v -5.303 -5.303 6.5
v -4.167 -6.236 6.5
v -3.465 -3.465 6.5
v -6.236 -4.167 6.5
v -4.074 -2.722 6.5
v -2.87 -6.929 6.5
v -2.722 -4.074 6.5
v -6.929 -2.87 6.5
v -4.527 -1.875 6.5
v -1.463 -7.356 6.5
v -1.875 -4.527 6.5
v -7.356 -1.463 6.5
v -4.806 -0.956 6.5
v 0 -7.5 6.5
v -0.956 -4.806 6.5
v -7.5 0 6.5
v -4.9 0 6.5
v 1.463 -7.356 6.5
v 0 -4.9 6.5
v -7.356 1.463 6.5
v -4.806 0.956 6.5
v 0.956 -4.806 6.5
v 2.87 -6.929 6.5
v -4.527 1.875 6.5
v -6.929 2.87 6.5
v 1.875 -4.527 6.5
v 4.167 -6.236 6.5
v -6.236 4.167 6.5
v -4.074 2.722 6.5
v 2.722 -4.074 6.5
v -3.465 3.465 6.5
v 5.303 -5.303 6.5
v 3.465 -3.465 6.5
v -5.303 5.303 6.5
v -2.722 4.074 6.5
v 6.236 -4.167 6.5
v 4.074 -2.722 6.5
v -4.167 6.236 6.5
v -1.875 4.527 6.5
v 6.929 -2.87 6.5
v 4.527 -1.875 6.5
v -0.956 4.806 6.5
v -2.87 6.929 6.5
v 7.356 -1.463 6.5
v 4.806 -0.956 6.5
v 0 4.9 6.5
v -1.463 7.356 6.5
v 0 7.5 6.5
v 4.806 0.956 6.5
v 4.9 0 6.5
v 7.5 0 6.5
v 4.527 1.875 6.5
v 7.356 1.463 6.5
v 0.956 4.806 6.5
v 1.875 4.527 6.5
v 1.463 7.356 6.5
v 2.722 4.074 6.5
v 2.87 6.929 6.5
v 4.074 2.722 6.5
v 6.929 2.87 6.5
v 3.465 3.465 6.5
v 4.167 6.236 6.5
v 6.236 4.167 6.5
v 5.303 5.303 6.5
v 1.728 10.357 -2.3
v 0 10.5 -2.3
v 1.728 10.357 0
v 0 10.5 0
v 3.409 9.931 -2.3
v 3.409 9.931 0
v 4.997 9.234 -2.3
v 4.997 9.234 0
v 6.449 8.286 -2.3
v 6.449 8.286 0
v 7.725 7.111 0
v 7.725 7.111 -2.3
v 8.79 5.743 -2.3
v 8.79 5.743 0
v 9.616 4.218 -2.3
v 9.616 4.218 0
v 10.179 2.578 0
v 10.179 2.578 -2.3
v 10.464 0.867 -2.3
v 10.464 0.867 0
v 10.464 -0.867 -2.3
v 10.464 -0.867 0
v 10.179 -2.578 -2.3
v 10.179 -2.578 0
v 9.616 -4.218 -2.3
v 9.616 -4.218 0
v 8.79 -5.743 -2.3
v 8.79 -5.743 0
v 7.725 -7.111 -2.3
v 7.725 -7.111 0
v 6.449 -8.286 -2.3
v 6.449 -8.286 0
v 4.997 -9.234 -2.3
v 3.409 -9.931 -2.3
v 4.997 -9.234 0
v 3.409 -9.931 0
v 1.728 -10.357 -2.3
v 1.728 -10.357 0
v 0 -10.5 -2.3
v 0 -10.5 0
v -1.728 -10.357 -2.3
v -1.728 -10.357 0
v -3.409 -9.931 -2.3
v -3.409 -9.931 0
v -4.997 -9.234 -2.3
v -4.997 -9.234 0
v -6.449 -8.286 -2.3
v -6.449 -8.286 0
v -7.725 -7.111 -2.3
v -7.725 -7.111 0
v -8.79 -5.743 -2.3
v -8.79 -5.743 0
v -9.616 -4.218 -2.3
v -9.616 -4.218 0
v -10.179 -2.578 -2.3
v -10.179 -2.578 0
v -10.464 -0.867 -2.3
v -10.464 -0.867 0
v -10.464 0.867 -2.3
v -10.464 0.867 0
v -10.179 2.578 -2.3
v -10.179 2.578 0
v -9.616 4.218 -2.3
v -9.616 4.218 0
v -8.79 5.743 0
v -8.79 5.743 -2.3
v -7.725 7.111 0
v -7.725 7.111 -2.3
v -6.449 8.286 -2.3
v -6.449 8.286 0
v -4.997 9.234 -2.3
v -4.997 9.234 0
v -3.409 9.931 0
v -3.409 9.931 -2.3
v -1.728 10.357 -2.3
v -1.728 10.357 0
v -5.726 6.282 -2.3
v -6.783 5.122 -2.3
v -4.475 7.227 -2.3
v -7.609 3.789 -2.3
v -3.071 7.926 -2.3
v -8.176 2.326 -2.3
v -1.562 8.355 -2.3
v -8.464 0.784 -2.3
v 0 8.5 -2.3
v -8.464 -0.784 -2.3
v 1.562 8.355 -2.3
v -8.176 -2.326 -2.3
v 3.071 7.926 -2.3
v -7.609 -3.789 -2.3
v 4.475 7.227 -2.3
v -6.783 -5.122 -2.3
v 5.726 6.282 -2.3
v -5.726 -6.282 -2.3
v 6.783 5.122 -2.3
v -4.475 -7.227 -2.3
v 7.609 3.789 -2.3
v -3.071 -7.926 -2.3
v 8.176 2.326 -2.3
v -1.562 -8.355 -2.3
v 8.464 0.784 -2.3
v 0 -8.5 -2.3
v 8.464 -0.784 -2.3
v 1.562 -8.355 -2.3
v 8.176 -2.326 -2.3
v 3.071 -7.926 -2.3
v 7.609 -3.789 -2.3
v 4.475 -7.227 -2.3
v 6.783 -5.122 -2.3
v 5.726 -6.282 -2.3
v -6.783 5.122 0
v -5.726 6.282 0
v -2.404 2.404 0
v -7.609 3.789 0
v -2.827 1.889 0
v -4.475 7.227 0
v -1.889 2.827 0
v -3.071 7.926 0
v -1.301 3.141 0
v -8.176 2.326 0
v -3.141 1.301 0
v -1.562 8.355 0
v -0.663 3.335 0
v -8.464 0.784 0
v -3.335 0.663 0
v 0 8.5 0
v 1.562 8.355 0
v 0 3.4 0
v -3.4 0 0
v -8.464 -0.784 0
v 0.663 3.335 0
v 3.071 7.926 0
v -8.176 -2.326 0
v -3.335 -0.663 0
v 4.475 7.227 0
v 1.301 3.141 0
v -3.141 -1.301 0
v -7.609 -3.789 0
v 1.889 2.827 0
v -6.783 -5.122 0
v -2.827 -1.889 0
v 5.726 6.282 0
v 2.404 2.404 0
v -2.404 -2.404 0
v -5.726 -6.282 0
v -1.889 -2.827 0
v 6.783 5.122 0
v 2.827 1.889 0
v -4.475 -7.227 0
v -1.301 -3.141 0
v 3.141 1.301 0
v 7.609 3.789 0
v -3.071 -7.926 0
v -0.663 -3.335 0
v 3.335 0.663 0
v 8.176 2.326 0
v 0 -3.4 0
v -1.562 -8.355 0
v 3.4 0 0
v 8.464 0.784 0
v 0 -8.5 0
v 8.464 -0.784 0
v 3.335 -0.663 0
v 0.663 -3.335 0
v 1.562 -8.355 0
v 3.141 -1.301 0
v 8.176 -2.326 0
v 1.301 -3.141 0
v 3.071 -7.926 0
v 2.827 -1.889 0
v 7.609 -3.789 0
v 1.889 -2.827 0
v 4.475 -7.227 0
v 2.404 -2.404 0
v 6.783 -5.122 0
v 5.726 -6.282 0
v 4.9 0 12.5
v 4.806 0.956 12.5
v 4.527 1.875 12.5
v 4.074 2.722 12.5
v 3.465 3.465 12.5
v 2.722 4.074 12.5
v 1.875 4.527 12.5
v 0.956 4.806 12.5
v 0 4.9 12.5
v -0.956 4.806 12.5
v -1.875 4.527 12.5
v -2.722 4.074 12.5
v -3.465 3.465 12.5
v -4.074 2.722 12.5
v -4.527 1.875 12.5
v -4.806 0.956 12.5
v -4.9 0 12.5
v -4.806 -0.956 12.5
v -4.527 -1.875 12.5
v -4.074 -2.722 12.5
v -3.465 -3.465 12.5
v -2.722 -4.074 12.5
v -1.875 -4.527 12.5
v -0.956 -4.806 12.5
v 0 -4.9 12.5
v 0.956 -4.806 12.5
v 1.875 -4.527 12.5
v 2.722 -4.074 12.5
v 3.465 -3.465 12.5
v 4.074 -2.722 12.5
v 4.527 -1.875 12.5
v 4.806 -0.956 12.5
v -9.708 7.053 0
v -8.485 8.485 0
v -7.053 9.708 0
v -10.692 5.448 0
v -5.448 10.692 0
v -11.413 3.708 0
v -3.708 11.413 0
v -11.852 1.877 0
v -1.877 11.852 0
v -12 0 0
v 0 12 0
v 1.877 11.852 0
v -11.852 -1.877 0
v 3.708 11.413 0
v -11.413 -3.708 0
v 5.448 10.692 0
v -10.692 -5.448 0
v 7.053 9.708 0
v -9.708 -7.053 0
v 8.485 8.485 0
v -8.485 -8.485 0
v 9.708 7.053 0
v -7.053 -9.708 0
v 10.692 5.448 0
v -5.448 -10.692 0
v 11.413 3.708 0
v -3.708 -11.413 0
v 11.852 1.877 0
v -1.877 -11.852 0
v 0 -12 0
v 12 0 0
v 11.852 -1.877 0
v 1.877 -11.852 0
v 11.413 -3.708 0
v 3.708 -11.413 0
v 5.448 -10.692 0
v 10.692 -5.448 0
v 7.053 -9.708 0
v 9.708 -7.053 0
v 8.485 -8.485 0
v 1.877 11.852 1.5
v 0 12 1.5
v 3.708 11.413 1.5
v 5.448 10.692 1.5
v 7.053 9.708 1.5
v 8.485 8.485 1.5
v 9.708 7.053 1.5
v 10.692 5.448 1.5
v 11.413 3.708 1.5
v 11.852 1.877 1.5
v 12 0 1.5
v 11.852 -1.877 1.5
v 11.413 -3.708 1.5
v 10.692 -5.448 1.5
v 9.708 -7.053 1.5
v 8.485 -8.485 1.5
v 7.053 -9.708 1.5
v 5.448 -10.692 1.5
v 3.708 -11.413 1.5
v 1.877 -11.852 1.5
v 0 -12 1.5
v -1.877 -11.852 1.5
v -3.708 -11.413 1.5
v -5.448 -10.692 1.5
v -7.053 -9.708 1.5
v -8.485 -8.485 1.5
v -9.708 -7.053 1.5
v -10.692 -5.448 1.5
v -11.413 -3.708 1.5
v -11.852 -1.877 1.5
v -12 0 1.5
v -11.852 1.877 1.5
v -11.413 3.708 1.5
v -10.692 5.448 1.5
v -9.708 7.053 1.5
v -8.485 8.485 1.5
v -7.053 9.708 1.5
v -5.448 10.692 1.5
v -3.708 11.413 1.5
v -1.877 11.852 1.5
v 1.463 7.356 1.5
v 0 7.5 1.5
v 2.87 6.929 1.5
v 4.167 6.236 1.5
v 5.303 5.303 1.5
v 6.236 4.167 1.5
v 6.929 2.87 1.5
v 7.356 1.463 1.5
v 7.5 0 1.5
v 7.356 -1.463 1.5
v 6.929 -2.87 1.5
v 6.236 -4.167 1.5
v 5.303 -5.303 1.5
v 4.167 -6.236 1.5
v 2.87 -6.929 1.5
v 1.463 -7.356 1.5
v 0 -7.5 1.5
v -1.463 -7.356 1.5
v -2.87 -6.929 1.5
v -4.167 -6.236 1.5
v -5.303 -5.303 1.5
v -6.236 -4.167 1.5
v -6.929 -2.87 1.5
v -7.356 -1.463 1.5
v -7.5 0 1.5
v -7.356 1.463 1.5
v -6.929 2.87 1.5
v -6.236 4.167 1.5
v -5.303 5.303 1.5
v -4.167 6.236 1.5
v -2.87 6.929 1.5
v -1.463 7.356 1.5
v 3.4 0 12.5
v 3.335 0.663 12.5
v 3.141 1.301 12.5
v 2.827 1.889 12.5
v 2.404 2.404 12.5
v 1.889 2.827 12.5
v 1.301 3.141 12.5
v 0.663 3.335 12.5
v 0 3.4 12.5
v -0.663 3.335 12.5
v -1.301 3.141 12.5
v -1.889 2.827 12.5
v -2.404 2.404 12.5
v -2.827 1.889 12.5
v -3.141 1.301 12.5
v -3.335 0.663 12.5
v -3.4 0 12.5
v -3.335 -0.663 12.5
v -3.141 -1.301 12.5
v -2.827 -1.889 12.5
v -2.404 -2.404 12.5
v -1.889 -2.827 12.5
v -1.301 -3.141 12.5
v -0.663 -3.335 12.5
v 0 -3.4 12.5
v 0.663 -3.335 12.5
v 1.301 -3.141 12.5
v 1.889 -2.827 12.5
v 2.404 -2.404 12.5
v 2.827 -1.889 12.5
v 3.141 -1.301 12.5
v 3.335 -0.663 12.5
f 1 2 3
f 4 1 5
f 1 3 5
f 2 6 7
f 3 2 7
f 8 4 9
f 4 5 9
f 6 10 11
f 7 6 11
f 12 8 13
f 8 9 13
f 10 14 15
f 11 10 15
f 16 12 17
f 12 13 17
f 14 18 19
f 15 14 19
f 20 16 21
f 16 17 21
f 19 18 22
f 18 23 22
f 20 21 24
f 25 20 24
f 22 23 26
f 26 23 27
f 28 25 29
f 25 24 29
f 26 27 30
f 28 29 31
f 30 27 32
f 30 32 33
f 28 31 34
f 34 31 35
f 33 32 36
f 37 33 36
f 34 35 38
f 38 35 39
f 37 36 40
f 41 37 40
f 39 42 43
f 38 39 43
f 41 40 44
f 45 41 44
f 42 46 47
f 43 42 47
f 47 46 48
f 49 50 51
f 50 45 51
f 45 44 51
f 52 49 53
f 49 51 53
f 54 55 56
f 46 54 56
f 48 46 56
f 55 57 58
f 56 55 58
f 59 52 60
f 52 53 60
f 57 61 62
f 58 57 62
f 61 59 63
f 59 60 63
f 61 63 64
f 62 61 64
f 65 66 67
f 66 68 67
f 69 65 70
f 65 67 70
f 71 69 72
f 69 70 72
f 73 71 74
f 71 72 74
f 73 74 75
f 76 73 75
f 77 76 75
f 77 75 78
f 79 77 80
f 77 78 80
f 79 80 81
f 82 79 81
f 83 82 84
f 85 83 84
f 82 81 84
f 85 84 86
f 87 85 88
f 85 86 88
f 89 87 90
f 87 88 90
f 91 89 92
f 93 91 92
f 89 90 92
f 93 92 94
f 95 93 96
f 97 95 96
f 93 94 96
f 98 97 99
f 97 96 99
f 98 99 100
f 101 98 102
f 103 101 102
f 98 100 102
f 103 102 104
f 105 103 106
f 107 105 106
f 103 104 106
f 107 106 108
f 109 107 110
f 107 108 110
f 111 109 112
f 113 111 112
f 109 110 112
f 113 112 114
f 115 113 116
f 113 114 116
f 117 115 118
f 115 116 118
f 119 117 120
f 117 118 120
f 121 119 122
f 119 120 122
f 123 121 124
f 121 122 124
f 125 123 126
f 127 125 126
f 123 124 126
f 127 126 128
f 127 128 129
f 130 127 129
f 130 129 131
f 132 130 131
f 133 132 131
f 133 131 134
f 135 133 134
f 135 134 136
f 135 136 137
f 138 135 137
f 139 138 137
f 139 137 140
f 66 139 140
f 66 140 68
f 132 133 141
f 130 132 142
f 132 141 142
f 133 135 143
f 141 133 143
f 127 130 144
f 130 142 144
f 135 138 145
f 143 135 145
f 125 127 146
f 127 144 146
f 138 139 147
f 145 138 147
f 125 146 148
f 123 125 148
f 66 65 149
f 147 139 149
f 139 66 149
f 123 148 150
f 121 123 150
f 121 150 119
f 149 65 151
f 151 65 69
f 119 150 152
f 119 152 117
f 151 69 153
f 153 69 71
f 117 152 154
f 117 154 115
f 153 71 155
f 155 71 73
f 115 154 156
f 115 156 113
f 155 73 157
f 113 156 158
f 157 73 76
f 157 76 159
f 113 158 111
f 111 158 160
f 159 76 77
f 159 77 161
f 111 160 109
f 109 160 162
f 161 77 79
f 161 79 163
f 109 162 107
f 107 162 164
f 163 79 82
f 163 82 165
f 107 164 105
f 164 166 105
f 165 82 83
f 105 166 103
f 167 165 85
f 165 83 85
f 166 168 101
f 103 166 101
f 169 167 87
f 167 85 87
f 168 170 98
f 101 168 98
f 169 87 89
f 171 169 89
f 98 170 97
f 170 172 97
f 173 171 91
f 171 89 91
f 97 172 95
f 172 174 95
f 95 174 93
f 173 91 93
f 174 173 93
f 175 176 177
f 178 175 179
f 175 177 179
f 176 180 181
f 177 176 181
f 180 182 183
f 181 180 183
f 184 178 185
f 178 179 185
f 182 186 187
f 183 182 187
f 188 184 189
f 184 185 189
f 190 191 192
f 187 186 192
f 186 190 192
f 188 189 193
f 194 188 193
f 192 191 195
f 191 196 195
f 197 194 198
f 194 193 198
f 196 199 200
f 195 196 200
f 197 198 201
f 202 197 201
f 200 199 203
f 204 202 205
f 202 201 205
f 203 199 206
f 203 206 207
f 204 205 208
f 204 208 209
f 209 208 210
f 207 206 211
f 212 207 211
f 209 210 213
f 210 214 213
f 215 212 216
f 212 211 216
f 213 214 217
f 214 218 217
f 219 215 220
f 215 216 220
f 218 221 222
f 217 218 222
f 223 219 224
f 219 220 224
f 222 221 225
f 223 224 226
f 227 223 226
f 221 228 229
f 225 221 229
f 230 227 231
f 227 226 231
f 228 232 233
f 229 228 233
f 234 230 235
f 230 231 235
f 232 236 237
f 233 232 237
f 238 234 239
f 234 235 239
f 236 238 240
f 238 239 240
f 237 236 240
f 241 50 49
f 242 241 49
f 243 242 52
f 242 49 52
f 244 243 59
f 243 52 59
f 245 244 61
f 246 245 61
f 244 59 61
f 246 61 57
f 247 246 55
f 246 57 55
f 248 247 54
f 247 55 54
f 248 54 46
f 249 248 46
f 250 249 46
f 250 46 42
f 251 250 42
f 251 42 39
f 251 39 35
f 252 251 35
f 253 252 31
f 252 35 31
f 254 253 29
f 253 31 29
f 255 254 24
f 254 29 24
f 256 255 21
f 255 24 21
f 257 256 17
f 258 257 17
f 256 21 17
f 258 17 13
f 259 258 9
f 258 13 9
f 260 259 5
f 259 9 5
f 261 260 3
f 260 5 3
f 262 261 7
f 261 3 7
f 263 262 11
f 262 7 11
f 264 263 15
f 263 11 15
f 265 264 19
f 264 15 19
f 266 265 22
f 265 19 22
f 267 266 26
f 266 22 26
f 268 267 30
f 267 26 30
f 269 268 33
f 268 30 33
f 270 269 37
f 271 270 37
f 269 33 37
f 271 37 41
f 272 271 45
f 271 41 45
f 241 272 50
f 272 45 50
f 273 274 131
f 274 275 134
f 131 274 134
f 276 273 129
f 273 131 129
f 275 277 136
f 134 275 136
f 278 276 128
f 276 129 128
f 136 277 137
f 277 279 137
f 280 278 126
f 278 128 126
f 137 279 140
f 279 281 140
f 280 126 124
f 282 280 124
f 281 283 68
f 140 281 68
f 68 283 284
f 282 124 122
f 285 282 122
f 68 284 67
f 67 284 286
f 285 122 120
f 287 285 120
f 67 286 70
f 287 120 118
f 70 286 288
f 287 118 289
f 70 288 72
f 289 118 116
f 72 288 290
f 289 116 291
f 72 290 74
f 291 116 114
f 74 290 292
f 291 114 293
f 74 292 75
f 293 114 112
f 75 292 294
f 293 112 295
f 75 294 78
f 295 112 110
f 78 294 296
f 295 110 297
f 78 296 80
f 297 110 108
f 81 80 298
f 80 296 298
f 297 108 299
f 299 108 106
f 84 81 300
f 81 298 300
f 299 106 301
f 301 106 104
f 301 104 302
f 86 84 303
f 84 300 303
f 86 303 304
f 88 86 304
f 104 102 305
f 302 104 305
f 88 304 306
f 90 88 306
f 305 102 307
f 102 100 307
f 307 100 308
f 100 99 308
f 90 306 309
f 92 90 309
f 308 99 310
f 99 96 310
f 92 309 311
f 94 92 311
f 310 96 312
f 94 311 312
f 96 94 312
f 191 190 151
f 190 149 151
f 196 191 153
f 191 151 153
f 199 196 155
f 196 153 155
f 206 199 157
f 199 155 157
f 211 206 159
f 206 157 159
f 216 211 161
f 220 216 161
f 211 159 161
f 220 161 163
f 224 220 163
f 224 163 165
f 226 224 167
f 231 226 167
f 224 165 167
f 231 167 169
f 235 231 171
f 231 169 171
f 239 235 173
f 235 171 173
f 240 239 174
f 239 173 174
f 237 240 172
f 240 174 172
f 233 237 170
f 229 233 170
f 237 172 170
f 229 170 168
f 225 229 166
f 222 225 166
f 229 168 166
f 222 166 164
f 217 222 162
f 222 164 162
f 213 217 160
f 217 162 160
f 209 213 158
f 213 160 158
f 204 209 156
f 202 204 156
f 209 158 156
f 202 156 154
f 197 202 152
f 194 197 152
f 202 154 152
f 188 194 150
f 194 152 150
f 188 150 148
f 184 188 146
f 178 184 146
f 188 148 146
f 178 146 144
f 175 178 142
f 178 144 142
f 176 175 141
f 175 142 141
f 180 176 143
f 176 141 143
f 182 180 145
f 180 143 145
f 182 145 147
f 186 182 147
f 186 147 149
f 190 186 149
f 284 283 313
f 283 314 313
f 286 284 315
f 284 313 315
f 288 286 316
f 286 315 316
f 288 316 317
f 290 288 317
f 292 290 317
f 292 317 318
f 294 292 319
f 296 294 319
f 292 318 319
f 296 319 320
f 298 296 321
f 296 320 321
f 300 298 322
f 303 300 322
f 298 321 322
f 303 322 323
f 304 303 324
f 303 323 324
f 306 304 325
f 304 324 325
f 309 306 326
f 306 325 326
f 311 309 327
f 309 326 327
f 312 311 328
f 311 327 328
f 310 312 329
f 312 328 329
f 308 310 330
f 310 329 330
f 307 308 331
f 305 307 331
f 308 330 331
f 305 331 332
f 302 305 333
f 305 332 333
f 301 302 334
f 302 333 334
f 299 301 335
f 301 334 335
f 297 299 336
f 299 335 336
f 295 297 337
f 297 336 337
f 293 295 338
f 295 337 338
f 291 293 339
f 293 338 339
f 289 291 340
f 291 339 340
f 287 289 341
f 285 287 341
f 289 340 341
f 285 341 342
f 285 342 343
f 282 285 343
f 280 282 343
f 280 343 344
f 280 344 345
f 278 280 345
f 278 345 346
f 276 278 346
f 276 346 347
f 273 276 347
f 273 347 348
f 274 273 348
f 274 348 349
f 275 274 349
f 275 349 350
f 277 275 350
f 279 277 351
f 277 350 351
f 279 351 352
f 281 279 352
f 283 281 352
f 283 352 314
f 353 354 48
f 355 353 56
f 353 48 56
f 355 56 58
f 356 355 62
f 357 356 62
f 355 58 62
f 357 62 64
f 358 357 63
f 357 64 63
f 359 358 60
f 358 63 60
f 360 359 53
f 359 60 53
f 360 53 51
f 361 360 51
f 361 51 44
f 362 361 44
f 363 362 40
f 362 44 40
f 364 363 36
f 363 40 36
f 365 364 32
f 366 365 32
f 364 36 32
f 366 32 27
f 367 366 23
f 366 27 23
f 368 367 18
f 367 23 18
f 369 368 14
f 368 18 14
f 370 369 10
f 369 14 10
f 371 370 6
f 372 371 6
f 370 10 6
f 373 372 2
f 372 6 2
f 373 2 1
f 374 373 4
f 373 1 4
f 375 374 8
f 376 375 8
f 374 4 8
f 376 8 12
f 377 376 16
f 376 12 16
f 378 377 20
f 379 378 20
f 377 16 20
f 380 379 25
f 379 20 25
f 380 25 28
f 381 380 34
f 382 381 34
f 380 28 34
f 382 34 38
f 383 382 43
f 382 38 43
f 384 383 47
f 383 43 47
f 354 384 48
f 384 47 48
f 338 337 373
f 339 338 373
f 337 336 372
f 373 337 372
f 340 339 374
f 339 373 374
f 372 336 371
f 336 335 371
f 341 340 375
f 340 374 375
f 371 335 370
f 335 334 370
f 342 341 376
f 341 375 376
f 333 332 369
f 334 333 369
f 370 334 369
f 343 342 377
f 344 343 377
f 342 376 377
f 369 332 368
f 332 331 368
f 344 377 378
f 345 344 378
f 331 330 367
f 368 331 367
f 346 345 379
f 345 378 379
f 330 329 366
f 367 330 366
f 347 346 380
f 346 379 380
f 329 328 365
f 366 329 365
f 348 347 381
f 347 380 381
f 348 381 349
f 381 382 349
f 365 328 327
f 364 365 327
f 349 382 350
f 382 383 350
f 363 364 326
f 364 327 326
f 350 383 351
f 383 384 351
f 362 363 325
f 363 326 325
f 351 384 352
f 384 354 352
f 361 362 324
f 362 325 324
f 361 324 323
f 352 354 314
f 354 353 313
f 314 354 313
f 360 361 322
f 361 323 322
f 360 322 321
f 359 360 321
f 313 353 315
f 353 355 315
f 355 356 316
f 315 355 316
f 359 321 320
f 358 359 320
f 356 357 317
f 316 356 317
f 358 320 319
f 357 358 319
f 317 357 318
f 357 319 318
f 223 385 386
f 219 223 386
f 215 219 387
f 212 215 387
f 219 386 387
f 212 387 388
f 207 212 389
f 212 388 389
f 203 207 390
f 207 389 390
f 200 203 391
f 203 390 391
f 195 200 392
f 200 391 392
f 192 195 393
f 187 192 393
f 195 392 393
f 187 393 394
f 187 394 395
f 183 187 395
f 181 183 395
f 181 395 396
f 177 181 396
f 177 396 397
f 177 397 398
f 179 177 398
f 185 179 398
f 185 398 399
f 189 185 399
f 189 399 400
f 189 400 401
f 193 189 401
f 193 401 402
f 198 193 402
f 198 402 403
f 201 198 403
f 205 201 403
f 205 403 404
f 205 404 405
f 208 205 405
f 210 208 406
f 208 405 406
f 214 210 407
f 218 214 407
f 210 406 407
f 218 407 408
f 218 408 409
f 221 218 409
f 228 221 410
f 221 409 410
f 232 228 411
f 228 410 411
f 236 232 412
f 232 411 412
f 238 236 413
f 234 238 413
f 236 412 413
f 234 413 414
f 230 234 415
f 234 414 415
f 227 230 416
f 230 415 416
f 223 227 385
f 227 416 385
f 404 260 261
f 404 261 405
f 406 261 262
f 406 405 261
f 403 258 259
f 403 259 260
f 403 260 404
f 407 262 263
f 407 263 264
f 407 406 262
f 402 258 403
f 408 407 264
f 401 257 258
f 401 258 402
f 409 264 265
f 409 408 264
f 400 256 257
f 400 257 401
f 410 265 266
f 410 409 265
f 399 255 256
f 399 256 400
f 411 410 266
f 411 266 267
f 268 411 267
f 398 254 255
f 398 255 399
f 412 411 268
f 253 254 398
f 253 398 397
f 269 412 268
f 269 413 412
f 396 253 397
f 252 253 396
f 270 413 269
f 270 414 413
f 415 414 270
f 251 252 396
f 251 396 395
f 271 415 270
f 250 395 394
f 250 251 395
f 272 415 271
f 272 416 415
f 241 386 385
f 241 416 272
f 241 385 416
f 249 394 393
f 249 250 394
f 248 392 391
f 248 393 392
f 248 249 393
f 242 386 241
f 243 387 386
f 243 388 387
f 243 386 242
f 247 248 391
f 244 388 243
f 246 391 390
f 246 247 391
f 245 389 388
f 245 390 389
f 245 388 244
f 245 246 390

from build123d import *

# Parameters (mm, degrees)
F2_R     = 4.9
F3_DEPTH = 6
F4_R     = 3.4
F5_DEPTH = 14.801


with BuildPart() as f1:
    # F0 (on Right) → F1 (revolve)
    with BuildSketch(Plane.YZ):
        Polygon((0, 6.5), (0, 0), (8.5, 0), (8.5, -2.3), (10.5, -2.3), (10.5, 0), (12, 0), (12, 1.5), (7.5, 1.5), (7.5, 6.5), align=None)
    revolve(axis=Axis((0, 0, 3.25), (0, 0, -1)))

    # F2 (on face) → F3 (join)
    with BuildSketch(Plane.XY.offset(6.5)):
        Circle(F2_R)
    extrude(amount=F3_DEPTH)

    # F4 (on face) → F5 (cut, through all)
    with BuildSketch(Plane.XY.offset(12.5)):
        Circle(F4_R)
    extrude(amount=-F5_DEPTH, mode=Mode.SUBTRACT)


solid = f1.part
